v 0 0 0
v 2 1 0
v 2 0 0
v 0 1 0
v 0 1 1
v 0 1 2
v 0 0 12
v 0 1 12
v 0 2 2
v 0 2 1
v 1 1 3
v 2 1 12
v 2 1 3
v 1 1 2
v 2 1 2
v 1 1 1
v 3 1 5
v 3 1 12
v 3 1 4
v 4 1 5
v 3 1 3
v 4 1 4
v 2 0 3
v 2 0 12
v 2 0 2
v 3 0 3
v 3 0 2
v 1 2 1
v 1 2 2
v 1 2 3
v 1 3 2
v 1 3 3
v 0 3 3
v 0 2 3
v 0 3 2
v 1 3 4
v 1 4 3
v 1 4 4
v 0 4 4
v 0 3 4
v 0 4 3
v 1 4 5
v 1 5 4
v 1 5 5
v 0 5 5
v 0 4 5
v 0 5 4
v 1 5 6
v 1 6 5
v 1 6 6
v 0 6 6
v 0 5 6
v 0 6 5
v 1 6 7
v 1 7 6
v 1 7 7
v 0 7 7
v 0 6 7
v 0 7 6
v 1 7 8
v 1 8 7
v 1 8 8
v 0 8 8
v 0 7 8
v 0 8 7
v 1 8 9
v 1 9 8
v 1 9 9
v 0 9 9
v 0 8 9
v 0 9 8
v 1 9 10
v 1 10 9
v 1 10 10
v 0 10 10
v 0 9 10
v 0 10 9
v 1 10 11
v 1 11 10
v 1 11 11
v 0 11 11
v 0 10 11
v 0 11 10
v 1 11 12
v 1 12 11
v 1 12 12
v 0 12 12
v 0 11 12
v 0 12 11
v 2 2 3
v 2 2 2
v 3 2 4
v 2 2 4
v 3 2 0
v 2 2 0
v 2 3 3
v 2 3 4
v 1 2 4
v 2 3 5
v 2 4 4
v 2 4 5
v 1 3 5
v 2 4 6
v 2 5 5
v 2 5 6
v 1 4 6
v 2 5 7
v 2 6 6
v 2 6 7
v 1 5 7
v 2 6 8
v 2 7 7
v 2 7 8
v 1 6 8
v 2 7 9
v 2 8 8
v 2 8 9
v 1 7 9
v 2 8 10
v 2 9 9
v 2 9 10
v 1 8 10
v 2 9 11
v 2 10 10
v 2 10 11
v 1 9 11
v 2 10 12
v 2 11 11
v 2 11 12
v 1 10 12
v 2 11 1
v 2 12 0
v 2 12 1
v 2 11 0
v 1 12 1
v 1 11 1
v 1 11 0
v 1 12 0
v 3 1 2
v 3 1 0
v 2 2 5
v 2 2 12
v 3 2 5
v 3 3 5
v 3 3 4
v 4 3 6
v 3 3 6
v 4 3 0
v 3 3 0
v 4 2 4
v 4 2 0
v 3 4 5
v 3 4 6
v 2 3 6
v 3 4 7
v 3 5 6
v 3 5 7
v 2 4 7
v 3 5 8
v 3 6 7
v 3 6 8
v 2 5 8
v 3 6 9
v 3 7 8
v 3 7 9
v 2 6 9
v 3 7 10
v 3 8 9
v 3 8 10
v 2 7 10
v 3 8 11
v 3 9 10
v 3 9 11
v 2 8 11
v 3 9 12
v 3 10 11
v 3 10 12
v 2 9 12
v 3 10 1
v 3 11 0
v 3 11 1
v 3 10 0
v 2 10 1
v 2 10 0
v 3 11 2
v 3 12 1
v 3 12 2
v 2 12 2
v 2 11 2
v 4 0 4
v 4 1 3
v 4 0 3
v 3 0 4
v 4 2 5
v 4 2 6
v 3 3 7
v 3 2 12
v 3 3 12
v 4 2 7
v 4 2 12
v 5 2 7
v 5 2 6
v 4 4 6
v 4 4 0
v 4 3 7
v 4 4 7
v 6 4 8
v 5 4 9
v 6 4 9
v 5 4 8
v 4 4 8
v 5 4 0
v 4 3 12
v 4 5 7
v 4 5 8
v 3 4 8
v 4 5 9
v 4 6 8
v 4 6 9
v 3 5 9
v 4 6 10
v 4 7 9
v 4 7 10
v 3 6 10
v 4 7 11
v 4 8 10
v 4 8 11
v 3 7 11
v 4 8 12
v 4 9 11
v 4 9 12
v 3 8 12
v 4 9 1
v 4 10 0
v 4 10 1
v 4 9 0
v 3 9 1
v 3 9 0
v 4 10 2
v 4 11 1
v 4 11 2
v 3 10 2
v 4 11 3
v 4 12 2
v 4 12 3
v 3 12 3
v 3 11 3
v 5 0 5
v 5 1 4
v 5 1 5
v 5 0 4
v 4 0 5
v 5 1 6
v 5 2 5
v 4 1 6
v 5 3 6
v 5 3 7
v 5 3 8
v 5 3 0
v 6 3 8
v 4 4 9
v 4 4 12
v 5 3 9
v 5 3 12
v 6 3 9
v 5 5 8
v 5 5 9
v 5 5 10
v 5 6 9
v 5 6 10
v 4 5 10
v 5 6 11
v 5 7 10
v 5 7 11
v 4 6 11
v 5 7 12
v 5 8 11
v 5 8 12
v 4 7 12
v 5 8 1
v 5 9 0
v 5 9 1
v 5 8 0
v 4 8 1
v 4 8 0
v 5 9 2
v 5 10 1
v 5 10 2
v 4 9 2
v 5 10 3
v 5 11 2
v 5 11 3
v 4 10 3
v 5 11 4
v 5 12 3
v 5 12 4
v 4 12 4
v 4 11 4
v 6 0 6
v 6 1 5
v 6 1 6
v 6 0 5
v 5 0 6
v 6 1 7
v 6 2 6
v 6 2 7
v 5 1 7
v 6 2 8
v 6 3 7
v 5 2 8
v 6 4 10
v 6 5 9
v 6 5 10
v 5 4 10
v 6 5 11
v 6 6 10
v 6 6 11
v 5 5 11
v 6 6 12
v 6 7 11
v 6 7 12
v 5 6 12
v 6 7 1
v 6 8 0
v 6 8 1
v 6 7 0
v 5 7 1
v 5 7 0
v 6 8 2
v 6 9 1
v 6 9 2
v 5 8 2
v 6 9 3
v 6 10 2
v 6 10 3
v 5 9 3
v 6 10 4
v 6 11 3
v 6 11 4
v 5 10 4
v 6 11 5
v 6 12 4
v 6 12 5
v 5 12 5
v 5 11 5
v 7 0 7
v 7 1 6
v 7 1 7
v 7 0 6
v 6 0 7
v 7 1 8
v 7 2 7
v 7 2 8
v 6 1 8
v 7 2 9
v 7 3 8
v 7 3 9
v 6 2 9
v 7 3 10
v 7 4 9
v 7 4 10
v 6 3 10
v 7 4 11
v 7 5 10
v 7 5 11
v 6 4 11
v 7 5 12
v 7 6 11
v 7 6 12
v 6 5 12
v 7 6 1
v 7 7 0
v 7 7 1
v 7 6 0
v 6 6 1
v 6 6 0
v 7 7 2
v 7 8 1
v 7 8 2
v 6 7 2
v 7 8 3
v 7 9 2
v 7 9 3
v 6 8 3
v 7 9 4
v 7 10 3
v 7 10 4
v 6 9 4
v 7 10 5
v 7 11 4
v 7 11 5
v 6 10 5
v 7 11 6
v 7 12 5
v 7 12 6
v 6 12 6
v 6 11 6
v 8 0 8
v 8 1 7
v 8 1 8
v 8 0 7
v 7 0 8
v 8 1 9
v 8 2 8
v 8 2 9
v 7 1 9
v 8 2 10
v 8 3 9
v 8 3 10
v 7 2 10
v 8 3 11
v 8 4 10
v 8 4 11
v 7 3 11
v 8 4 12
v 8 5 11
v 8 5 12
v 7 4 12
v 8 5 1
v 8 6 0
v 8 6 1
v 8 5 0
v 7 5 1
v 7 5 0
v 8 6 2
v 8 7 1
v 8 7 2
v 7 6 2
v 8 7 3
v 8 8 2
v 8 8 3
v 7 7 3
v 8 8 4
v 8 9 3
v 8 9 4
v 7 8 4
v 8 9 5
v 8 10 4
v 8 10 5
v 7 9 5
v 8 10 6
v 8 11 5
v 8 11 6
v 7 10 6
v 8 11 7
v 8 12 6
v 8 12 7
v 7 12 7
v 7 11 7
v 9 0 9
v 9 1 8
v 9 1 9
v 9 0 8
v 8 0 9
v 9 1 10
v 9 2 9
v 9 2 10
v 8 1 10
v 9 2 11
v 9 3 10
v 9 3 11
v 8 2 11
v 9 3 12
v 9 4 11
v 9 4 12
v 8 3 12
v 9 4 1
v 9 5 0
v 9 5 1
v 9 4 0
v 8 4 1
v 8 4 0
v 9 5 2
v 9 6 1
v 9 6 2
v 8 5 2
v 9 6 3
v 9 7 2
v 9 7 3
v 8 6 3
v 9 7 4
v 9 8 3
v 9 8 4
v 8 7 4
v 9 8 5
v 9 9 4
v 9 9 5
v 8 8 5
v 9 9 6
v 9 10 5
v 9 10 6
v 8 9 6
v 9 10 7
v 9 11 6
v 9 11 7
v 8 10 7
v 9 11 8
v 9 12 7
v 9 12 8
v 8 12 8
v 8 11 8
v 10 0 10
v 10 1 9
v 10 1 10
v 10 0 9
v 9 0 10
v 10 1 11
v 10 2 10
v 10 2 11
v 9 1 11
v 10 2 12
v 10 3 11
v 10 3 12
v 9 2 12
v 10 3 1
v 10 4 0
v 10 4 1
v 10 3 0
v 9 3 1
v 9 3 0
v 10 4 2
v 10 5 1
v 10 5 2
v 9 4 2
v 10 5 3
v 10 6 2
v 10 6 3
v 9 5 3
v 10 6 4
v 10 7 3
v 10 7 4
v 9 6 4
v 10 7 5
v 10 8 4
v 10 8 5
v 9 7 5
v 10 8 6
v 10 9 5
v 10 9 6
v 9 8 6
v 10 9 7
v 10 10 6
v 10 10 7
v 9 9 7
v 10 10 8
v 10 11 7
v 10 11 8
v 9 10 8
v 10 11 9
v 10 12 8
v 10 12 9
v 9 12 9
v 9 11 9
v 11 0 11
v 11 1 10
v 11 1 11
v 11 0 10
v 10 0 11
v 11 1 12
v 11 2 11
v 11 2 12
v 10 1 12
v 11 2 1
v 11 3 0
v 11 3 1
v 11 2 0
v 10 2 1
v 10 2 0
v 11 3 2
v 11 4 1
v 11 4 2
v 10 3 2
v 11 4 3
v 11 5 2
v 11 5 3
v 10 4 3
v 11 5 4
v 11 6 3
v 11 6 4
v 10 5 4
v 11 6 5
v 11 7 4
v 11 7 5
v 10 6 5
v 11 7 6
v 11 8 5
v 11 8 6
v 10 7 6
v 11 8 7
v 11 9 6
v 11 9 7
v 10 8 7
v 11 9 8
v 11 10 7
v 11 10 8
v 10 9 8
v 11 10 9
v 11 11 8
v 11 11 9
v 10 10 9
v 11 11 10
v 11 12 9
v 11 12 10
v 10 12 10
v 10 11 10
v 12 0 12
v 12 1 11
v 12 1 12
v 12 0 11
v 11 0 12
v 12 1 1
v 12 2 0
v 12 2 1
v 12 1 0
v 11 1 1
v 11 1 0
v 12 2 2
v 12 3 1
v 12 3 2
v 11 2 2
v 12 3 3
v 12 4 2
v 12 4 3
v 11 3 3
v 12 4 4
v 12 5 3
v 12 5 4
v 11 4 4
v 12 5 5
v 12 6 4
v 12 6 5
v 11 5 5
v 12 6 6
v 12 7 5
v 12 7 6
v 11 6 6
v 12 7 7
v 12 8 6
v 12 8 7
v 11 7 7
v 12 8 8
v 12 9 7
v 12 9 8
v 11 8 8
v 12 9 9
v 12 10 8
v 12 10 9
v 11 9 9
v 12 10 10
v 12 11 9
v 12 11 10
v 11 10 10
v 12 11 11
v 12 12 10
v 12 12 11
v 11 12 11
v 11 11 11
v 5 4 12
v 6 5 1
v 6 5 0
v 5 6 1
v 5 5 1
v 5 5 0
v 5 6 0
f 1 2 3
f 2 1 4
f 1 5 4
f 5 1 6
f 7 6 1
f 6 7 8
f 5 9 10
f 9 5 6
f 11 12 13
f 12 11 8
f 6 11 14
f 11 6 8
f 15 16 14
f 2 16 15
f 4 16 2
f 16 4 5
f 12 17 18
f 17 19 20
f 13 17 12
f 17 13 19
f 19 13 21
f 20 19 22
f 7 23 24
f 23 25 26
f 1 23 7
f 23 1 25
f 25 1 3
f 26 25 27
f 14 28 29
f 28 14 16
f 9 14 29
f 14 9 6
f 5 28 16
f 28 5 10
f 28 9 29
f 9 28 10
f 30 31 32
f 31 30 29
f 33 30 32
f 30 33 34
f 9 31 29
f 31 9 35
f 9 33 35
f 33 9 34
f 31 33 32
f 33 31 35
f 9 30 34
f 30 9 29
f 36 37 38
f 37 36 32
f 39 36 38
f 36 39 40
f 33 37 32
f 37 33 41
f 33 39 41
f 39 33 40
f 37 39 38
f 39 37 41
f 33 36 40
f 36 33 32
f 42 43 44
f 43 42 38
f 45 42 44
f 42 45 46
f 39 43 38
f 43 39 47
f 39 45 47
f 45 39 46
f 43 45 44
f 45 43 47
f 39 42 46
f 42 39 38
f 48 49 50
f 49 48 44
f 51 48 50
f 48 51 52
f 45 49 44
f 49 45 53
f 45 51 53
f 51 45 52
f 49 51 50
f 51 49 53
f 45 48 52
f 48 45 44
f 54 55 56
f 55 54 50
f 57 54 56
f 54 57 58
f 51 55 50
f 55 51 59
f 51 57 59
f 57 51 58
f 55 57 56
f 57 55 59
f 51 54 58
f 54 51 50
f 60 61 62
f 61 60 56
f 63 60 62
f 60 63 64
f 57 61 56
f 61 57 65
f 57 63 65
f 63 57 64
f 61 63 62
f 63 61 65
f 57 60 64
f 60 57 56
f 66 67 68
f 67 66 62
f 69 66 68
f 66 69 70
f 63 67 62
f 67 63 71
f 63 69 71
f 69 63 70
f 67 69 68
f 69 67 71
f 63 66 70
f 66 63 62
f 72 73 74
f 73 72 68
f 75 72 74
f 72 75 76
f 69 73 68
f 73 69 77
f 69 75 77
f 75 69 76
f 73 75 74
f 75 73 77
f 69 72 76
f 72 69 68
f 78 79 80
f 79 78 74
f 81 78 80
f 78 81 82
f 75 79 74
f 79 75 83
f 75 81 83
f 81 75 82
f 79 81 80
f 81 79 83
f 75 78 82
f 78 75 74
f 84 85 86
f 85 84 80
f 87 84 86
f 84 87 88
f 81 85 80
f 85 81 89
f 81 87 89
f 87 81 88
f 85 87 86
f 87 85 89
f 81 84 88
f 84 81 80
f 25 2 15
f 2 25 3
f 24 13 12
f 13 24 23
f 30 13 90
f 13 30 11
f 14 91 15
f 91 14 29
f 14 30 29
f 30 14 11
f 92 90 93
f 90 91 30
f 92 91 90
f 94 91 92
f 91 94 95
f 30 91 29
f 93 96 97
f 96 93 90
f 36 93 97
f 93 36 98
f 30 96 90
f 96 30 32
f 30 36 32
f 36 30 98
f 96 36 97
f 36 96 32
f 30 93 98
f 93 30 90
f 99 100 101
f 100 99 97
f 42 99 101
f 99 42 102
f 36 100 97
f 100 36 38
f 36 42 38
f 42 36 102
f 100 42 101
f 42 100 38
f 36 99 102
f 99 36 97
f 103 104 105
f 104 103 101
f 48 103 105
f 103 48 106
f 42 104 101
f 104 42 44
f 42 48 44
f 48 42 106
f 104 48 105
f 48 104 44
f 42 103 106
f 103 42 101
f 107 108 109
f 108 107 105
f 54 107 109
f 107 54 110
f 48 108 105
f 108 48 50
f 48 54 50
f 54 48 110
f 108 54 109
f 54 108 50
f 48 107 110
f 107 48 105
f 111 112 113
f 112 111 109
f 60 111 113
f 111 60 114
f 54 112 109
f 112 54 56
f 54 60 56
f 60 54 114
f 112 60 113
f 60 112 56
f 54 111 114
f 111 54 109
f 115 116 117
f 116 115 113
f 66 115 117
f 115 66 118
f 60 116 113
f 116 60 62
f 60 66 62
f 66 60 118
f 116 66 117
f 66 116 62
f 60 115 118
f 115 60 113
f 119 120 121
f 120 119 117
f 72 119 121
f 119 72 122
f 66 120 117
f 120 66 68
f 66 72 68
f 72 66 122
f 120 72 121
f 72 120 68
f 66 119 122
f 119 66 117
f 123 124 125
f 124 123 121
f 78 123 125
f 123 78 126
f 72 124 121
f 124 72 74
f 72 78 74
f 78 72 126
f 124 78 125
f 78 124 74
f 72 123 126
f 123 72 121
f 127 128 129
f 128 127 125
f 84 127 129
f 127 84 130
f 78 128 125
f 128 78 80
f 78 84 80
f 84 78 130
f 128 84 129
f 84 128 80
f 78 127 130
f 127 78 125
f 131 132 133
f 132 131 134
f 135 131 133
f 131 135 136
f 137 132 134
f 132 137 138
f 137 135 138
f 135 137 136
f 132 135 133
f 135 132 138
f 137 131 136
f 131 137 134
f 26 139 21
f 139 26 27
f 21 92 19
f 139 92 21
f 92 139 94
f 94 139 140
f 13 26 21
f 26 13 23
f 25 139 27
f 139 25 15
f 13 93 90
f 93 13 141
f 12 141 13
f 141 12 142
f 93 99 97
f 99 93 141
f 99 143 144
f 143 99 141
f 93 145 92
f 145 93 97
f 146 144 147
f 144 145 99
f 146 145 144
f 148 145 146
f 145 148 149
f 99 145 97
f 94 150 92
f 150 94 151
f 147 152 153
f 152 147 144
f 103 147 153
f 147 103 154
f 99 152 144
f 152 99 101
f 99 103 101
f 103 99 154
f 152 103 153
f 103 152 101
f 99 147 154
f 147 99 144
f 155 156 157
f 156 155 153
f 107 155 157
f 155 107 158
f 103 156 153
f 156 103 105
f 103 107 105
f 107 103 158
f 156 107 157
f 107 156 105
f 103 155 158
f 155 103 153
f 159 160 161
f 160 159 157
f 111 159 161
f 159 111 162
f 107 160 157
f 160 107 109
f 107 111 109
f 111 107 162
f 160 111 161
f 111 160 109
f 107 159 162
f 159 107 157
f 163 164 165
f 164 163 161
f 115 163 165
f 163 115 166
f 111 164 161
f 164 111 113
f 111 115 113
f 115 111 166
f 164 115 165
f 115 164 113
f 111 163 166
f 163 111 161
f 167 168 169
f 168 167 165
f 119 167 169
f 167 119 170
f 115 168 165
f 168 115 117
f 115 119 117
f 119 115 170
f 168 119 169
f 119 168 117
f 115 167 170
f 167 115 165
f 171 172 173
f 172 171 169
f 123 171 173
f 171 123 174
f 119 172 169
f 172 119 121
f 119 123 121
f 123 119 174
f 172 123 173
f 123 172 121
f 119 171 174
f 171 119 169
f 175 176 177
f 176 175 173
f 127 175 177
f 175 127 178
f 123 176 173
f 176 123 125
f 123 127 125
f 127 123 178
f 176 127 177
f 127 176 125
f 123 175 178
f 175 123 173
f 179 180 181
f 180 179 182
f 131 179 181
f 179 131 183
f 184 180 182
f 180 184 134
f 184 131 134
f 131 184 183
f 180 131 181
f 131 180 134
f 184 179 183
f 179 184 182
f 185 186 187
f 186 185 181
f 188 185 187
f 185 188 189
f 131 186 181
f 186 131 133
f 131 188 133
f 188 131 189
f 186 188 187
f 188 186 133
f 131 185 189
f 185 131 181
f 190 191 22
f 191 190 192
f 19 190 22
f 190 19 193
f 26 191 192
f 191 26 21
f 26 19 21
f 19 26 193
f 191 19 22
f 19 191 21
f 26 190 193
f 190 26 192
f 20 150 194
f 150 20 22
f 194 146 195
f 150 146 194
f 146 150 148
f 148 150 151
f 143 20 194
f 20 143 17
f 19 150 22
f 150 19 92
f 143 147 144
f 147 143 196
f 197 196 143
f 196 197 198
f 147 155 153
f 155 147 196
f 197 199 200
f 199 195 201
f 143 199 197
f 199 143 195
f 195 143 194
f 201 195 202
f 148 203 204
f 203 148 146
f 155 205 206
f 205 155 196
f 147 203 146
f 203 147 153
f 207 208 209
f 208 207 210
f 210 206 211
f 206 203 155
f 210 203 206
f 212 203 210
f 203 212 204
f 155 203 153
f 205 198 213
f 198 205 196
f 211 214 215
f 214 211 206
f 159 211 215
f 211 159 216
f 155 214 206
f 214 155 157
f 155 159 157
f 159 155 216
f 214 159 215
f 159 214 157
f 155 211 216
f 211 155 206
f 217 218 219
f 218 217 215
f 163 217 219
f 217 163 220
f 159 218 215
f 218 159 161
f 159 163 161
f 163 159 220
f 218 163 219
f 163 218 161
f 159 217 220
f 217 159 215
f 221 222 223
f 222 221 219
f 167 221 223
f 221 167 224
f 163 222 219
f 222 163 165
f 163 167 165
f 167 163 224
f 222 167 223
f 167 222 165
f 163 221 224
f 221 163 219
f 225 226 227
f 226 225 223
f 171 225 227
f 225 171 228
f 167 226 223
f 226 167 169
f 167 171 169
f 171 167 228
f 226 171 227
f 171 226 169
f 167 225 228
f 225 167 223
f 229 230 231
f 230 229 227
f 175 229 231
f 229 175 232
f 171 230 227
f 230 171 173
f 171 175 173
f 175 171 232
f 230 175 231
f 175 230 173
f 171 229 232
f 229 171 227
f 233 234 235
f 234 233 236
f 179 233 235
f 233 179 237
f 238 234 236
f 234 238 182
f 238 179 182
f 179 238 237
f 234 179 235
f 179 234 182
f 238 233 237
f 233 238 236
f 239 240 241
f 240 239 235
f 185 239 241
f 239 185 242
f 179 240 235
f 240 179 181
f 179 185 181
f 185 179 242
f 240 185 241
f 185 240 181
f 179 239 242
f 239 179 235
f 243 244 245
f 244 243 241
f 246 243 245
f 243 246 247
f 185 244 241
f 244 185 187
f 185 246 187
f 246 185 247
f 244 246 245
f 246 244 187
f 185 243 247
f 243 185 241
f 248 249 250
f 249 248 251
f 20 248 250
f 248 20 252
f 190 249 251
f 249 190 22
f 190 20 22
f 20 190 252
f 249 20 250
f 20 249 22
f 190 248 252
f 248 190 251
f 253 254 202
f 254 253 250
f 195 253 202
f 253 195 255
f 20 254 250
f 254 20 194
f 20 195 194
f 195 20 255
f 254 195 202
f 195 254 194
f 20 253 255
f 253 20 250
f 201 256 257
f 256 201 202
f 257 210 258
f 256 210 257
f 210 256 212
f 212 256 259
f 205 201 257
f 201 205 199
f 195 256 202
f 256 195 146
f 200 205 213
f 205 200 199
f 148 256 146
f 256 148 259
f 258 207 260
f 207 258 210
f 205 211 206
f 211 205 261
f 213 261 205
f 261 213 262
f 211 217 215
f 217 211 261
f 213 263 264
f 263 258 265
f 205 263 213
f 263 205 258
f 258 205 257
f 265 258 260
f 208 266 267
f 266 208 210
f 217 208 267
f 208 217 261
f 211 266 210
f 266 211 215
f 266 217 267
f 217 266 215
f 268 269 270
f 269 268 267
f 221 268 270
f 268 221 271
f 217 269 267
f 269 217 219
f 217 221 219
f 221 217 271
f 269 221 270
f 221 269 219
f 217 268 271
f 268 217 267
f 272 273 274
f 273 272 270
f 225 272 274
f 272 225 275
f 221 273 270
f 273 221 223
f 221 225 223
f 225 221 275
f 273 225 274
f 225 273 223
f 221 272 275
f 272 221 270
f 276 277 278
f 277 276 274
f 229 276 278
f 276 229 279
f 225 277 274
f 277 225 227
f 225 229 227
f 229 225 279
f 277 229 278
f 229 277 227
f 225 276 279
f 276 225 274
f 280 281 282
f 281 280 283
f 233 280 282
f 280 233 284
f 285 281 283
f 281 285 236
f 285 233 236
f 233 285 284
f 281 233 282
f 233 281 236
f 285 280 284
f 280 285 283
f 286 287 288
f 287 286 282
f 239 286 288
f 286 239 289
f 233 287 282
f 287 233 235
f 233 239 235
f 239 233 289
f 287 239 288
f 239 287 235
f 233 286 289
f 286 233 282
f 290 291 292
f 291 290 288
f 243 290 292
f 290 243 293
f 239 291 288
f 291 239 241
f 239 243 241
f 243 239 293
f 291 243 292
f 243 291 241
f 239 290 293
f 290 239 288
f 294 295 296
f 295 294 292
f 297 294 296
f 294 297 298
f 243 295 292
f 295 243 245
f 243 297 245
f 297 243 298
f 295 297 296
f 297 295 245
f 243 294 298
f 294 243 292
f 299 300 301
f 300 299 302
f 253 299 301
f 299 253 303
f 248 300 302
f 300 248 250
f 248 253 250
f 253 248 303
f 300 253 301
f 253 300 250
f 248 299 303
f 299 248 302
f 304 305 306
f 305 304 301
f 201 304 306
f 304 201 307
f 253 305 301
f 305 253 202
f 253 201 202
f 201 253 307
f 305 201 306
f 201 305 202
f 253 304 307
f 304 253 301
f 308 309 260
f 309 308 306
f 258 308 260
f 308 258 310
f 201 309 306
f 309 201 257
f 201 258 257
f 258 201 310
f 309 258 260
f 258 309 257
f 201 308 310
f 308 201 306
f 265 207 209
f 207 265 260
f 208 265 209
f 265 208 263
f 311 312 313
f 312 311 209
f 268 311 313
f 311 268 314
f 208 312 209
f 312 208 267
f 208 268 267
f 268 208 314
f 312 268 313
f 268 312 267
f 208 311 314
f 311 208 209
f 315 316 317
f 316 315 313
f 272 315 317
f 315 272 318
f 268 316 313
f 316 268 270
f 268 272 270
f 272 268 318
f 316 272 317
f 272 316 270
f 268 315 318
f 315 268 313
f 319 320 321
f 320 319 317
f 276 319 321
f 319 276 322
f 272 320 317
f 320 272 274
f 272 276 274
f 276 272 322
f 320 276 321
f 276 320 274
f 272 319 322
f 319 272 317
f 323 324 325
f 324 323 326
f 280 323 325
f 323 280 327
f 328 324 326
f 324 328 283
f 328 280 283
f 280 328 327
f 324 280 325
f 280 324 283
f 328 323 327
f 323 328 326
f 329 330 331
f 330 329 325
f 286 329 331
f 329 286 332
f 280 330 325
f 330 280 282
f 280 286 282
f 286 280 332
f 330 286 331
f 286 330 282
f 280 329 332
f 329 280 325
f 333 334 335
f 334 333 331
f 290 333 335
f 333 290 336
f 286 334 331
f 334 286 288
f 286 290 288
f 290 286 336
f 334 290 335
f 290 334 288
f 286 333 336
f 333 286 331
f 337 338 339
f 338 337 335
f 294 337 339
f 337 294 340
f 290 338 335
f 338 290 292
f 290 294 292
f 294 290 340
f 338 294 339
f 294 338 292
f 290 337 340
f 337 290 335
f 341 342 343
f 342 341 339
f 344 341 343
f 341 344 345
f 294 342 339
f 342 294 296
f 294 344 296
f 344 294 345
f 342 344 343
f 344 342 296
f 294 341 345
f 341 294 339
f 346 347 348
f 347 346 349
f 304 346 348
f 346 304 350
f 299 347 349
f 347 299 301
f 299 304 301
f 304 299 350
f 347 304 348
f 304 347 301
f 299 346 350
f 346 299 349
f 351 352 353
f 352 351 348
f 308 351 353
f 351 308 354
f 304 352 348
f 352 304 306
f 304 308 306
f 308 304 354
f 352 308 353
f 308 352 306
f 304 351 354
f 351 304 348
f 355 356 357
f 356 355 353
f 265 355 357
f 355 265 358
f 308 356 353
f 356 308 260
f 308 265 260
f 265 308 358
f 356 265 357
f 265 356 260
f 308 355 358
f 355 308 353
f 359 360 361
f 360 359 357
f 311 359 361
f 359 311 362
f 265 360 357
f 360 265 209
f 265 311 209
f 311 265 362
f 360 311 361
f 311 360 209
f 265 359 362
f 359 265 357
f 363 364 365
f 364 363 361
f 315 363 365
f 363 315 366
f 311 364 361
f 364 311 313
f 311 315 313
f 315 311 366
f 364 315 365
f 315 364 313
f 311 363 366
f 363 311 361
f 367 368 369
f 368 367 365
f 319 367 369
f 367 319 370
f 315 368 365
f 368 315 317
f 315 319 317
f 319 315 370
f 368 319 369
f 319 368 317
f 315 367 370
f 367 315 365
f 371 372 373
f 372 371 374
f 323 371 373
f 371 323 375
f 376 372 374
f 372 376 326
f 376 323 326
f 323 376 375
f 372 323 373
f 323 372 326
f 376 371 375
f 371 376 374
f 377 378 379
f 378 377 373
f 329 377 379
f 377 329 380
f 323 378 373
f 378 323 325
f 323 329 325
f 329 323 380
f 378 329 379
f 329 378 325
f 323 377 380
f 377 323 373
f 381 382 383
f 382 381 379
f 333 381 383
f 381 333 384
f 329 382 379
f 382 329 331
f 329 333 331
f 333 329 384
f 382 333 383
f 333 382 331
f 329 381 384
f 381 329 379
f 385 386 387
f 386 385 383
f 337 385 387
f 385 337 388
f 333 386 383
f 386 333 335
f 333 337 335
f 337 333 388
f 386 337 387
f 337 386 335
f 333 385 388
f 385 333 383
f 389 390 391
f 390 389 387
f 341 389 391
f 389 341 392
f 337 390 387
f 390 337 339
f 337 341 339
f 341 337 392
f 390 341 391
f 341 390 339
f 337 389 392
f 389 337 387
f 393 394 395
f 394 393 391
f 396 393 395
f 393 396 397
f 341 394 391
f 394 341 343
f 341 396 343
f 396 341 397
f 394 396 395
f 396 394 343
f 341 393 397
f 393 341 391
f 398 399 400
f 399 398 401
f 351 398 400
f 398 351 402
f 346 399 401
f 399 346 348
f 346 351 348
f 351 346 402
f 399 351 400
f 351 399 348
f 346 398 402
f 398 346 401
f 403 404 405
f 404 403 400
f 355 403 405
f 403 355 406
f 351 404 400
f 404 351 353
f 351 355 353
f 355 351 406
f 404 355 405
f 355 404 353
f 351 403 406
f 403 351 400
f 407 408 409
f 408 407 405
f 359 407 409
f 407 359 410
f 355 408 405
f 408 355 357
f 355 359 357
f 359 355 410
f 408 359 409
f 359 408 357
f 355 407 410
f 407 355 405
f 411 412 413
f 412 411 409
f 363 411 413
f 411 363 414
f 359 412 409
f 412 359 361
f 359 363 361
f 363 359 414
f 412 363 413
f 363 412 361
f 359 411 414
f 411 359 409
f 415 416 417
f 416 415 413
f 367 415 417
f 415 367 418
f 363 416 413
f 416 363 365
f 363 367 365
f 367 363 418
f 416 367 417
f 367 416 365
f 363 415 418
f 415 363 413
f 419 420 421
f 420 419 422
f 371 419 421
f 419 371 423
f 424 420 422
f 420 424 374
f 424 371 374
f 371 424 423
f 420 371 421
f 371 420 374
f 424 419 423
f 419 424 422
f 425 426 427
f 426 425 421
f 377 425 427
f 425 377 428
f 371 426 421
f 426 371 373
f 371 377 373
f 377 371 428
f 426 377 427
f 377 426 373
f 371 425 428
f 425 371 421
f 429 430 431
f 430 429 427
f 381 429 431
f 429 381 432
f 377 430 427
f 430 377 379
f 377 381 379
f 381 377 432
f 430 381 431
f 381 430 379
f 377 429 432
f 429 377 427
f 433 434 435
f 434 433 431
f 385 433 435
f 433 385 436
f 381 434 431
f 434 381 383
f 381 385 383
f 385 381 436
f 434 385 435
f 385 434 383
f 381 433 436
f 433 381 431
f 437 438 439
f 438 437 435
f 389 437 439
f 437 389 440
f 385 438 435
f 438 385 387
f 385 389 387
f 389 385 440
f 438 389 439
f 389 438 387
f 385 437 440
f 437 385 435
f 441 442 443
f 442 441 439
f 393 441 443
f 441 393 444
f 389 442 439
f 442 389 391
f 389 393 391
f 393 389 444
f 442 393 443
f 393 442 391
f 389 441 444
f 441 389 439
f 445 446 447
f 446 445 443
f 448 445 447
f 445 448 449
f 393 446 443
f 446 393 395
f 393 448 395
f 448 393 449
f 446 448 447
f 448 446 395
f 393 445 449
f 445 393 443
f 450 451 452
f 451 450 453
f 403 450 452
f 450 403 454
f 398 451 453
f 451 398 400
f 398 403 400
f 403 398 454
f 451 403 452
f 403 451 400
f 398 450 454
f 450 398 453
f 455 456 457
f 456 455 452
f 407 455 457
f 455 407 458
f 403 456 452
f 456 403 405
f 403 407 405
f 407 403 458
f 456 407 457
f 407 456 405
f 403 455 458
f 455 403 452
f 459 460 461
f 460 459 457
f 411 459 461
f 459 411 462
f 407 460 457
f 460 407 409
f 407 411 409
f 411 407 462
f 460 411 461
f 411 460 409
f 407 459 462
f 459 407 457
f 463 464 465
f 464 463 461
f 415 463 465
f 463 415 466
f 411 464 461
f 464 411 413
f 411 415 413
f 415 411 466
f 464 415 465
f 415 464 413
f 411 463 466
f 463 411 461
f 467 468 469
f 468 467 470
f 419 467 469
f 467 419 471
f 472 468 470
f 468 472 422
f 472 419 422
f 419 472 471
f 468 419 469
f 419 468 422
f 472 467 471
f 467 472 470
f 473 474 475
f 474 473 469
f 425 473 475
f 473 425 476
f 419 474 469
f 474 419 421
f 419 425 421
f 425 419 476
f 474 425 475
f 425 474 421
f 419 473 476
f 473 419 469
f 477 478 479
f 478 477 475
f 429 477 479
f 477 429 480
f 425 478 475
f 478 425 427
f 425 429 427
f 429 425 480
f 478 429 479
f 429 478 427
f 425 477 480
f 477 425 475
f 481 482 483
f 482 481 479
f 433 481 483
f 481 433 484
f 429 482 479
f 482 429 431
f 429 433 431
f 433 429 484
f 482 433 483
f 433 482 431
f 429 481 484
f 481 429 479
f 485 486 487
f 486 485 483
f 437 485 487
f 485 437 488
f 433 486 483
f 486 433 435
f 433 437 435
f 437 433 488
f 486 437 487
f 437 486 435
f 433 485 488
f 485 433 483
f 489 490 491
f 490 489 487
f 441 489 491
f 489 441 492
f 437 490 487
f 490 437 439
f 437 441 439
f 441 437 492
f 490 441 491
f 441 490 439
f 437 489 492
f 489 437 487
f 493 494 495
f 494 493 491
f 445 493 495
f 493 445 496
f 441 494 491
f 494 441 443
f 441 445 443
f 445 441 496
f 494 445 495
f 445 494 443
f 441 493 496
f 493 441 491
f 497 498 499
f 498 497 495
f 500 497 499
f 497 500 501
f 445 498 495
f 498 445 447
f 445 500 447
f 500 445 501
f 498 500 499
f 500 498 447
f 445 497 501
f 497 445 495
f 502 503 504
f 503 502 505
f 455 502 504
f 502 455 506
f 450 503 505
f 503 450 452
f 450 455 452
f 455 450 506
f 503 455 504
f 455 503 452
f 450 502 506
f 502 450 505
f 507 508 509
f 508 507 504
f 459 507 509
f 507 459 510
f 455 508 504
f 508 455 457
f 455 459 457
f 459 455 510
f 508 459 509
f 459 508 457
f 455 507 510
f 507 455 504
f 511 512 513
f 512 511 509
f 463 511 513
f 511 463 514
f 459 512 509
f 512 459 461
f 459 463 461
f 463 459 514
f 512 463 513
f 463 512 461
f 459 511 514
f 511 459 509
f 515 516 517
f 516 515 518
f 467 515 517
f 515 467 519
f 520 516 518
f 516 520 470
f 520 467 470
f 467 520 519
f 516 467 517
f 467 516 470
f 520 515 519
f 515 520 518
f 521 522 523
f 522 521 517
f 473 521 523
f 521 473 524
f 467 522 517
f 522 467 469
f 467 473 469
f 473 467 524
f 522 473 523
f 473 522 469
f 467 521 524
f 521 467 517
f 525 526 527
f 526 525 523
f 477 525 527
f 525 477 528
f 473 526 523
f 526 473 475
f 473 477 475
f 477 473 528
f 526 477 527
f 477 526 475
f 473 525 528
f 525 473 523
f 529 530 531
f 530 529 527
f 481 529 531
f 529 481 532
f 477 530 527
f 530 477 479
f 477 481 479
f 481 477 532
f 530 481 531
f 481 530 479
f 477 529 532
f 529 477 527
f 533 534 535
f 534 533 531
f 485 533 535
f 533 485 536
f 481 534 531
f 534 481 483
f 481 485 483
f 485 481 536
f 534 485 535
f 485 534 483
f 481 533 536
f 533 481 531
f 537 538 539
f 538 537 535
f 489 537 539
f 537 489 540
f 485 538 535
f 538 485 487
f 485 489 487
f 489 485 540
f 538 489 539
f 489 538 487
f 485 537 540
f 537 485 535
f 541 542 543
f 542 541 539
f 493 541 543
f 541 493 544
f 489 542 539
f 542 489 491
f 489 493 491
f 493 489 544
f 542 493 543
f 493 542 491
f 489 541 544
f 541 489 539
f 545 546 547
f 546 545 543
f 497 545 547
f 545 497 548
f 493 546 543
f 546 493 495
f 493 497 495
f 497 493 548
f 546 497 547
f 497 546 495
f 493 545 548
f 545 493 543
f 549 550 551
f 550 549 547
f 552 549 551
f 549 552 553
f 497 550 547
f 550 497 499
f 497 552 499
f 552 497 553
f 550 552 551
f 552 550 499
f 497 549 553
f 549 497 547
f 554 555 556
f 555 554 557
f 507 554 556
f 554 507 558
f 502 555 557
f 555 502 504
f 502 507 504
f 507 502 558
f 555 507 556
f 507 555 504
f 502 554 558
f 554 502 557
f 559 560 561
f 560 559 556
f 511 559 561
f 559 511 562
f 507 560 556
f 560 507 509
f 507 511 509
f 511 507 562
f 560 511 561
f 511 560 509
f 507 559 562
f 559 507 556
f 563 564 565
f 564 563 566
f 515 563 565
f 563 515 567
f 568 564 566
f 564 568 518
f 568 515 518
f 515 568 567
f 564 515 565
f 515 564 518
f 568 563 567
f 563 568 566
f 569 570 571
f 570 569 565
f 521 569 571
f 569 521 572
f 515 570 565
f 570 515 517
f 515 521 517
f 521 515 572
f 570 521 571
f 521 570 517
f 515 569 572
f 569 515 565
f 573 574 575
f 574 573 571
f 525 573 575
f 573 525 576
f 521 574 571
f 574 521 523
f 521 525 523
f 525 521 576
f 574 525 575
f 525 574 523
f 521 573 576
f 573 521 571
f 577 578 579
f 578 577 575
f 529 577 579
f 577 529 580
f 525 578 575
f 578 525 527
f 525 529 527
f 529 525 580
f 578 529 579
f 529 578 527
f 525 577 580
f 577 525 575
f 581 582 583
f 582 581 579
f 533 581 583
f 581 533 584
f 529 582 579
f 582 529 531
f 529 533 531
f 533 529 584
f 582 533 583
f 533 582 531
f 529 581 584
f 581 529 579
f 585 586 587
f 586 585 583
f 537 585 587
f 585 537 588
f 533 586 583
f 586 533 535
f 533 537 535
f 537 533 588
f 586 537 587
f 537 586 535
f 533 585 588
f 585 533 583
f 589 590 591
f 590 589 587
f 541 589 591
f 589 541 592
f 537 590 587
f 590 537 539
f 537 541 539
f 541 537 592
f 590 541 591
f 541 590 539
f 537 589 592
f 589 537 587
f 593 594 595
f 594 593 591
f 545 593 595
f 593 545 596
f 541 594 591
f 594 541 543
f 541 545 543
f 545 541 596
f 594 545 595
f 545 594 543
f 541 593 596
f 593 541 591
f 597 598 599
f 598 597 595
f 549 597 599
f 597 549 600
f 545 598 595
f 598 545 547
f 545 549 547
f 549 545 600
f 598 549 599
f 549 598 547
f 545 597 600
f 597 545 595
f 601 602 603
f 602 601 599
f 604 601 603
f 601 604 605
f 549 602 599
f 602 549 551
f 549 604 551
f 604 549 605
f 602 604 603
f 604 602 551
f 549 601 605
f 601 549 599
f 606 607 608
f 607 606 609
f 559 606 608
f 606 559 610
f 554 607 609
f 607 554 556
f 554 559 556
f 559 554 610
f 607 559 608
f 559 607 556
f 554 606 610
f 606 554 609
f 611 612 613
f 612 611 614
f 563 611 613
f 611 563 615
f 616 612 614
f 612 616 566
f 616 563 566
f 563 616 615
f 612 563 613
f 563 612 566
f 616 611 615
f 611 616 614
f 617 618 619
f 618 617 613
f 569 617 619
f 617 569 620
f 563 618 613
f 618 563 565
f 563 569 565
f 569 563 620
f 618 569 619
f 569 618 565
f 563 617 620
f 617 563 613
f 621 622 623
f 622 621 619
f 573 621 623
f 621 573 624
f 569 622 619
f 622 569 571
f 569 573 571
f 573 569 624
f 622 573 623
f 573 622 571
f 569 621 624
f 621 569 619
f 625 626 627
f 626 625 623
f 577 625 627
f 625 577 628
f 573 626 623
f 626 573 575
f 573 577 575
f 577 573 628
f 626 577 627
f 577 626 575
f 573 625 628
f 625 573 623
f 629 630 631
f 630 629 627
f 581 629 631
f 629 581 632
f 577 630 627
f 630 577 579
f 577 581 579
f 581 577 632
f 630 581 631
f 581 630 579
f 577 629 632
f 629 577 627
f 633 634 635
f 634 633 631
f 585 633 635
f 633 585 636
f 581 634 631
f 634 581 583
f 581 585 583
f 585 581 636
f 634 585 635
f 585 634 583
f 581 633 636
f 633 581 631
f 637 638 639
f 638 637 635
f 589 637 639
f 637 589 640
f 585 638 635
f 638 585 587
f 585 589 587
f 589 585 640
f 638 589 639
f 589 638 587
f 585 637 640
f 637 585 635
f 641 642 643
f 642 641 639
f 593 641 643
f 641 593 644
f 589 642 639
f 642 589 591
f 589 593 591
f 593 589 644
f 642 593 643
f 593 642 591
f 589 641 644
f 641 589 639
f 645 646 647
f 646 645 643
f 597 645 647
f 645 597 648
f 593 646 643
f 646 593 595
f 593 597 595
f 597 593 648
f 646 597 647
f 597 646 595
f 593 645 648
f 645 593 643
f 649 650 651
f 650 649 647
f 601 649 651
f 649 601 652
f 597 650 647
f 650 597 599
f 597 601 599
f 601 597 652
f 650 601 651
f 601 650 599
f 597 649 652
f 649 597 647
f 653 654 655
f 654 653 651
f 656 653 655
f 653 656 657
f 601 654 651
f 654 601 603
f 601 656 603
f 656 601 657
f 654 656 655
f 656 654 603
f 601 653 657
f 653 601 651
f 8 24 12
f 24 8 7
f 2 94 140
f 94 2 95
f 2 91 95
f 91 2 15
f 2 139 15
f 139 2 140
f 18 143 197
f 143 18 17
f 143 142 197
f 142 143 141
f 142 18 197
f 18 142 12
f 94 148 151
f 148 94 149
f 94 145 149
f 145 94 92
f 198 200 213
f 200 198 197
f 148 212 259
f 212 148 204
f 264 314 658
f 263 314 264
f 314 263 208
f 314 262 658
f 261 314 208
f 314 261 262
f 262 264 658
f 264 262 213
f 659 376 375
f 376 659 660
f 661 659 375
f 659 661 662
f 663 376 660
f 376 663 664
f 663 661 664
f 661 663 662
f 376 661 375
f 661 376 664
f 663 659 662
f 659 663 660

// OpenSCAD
union() {
    translate([0, 0, 0]) cube([1, 1, 1]);
    translate([0, 1, 1]) cube([1, 1, 1]);
    translate([0, 2, 2]) cube([1, 1, 1]);
    translate([0, 3, 3]) cube([1, 1, 1]);
    translate([0, 4, 4]) cube([1, 1, 1]);
    translate([0, 5, 5]) cube([1, 1, 1]);
    translate([0, 6, 6]) cube([1, 1, 1]);
    translate([0, 7, 7]) cube([1, 1, 1]);
    translate([0, 8, 8]) cube([1, 1, 1]);
    translate([0, 9, 9]) cube([1, 1, 1]);
    translate([0, 10, 10]) cube([1, 1, 1]);
    translate([0, 11, 11]) cube([1, 1, 1]);
    translate([1, 0, 1]) cube([1, 1, 1]);
    translate([1, 1, 2]) cube([1, 1, 1]);
    translate([1, 2, 3]) cube([1, 1, 1]);
    translate([1, 3, 4]) cube([1, 1, 1]);
    translate([1, 4, 5]) cube([1, 1, 1]);
    translate([1, 5, 6]) cube([1, 1, 1]);
    translate([1, 6, 7]) cube([1, 1, 1]);
    translate([1, 7, 8]) cube([1, 1, 1]);
    translate([1, 8, 9]) cube([1, 1, 1]);
    translate([1, 9, 10]) cube([1, 1, 1]);
    translate([1, 10, 11]) cube([1, 1, 1]);
    translate([1, 11, 0]) cube([1, 1, 1]);
    translate([2, 0, 2]) cube([1, 1, 1]);
    translate([2, 1, 3]) cube([1, 1, 1]);
    translate([2, 2, 4]) cube([1, 1, 1]);
    translate([2, 3, 5]) cube([1, 1, 1]);
    translate([2, 4, 6]) cube([1, 1, 1]);
    translate([2, 5, 7]) cube([1, 1, 1]);
    translate([2, 6, 8]) cube([1, 1, 1]);
    translate([2, 7, 9]) cube([1, 1, 1]);
    translate([2, 8, 10]) cube([1, 1, 1]);
    translate([2, 9, 11]) cube([1, 1, 1]);
    translate([2, 10, 0]) cube([1, 1, 1]);
    translate([2, 11, 1]) cube([1, 1, 1]);
    translate([3, 0, 3]) cube([1, 1, 1]);
    translate([3, 1, 4]) cube([1, 1, 1]);
    translate([3, 2, 5]) cube([1, 1, 1]);
    translate([3, 3, 6]) cube([1, 1, 1]);
    translate([3, 4, 7]) cube([1, 1, 1]);
    translate([3, 5, 8]) cube([1, 1, 1]);
    translate([3, 6, 9]) cube([1, 1, 1]);
    translate([3, 7, 10]) cube([1, 1, 1]);
    translate([3, 8, 11]) cube([1, 1, 1]);
    translate([3, 9, 0]) cube([1, 1, 1]);
    translate([3, 10, 1]) cube([1, 1, 1]);
    translate([3, 11, 2]) cube([1, 1, 1]);
    translate([4, 0, 4]) cube([1, 1, 1]);
    translate([4, 1, 5]) cube([1, 1, 1]);
    translate([4, 2, 6]) cube([1, 1, 1]);
    translate([4, 3, 7]) cube([1, 1, 1]);
    translate([4, 4, 8]) cube([1, 1, 1]);
    translate([4, 5, 9]) cube([1, 1, 1]);
    translate([4, 6, 10]) cube([1, 1, 1]);
    translate([4, 7, 11]) cube([1, 1, 1]);
    translate([4, 8, 0]) cube([1, 1, 1]);
    translate([4, 9, 1]) cube([1, 1, 1]);
    translate([4, 10, 2]) cube([1, 1, 1]);
    translate([4, 11, 3]) cube([1, 1, 1]);
    translate([5, 0, 5]) cube([1, 1, 1]);
    translate([5, 1, 6]) cube([1, 1, 1]);
    translate([5, 2, 7]) cube([1, 1, 1]);
    translate([5, 3, 8]) cube([1, 1, 1]);
    translate([5, 4, 9]) cube([1, 1, 1]);
    translate([5, 5, 10]) cube([1, 1, 1]);
    translate([5, 6, 11]) cube([1, 1, 1]);
    translate([5, 7, 0]) cube([1, 1, 1]);
    translate([5, 8, 1]) cube([1, 1, 1]);
    translate([5, 9, 2]) cube([1, 1, 1]);
    translate([5, 10, 3]) cube([1, 1, 1]);
    translate([5, 11, 4]) cube([1, 1, 1]);
    translate([6, 0, 6]) cube([1, 1, 1]);
    translate([6, 1, 7]) cube([1, 1, 1]);
    translate([6, 2, 8]) cube([1, 1, 1]);
    translate([6, 3, 9]) cube([1, 1, 1]);
    translate([6, 4, 10]) cube([1, 1, 1]);
    translate([6, 5, 11]) cube([1, 1, 1]);
    translate([6, 6, 0]) cube([1, 1, 1]);
    translate([6, 7, 1]) cube([1, 1, 1]);
    translate([6, 8, 2]) cube([1, 1, 1]);
    translate([6, 9, 3]) cube([1, 1, 1]);
    translate([6, 10, 4]) cube([1, 1, 1]);
    translate([6, 11, 5]) cube([1, 1, 1]);
    translate([7, 0, 7]) cube([1, 1, 1]);
    translate([7, 1, 8]) cube([1, 1, 1]);
    translate([7, 2, 9]) cube([1, 1, 1]);
    translate([7, 3, 10]) cube([1, 1, 1]);
    translate([7, 4, 11]) cube([1, 1, 1]);
    translate([7, 5, 0]) cube([1, 1, 1]);
    translate([7, 6, 1]) cube([1, 1, 1]);
    translate([7, 7, 2]) cube([1, 1, 1]);
    translate([7, 8, 3]) cube([1, 1, 1]);
    translate([7, 9, 4]) cube([1, 1, 1]);
    translate([7, 10, 5]) cube([1, 1, 1]);
    translate([7, 11, 6]) cube([1, 1, 1]);
    translate([8, 0, 8]) cube([1, 1, 1]);
    translate([8, 1, 9]) cube([1, 1, 1]);
    translate([8, 2, 10]) cube([1, 1, 1]);
    translate([8, 3, 11]) cube([1, 1, 1]);
    translate([8, 4, 0]) cube([1, 1, 1]);
    translate([8, 5, 1]) cube([1, 1, 1]);
    translate([8, 6, 2]) cube([1, 1, 1]);
    translate([8, 7, 3]) cube([1, 1, 1]);
    translate([8, 8, 4]) cube([1, 1, 1]);
    translate([8, 9, 5]) cube([1, 1, 1]);
    translate([8, 10, 6]) cube([1, 1, 1]);
    translate([8, 11, 7]) cube([1, 1, 1]);
    translate([9, 0, 9]) cube([1, 1, 1]);
    translate([9, 1, 10]) cube([1, 1, 1]);
    translate([9, 2, 11]) cube([1, 1, 1]);
    translate([9, 3, 0]) cube([1, 1, 1]);
    translate([9, 4, 1]) cube([1, 1, 1]);
    translate([9, 5, 2]) cube([1, 1, 1]);
    translate([9, 6, 3]) cube([1, 1, 1]);
    translate([9, 7, 4]) cube([1, 1, 1]);
    translate([9, 8, 5]) cube([1, 1, 1]);
    translate([9, 9, 6]) cube([1, 1, 1]);
    translate([9, 10, 7]) cube([1, 1, 1]);
    translate([9, 11, 8]) cube([1, 1, 1]);
    translate([10, 0, 10]) cube([1, 1, 1]);
    translate([10, 1, 11]) cube([1, 1, 1]);
    translate([10, 2, 0]) cube([1, 1, 1]);
    translate([10, 3, 1]) cube([1, 1, 1]);
    translate([10, 4, 2]) cube([1, 1, 1]);
    translate([10, 5, 3]) cube([1, 1, 1]);
    translate([10, 6, 4]) cube([1, 1, 1]);
    translate([10, 7, 5]) cube([1, 1, 1]);
    translate([10, 8, 6]) cube([1, 1, 1]);
    translate([10, 9, 7]) cube([1, 1, 1]);
    translate([10, 10, 8]) cube([1, 1, 1]);
    translate([10, 11, 9]) cube([1, 1, 1]);
    translate([11, 0, 11]) cube([1, 1, 1]);
    translate([11, 1, 0]) cube([1, 1, 1]);
    translate([11, 2, 1]) cube([1, 1, 1]);
    translate([11, 3, 2]) cube([1, 1, 1]);
    translate([11, 4, 3]) cube([1, 1, 1]);
    translate([11, 5, 4]) cube([1, 1, 1]);
    translate([11, 6, 5]) cube([1, 1, 1]);
    translate([11, 7, 6]) cube([1, 1, 1]);
    translate([11, 8, 7]) cube([1, 1, 1]);
    translate([11, 9, 8]) cube([1, 1, 1]);
    translate([11, 10, 9]) cube([1, 1, 1]);
    translate([11, 11, 10]) cube([1, 1, 1]);
    translate([0, 0, 1]) cube([1, 1, 1]);
    translate([0, 0, 2]) cube([1, 1, 1]);
    translate([0, 0, 3]) cube([1, 1, 1]);
    translate([0, 0, 4]) cube([1, 1, 1]);
    translate([0, 0, 5]) cube([1, 1, 1]);
    translate([0, 0, 6]) cube([1, 1, 1]);
    translate([0, 0, 7]) cube([1, 1, 1]);
    translate([0, 0, 8]) cube([1, 1, 1]);
    translate([0, 0, 9]) cube([1, 1, 1]);
    translate([0, 0, 10]) cube([1, 1, 1]);
    translate([0, 0, 11]) cube([1, 1, 1]);
    translate([1, 0, 0]) cube([1, 1, 1]);
    translate([1, 0, 2]) cube([1, 1, 1]);
    translate([1, 0, 3]) cube([1, 1, 1]);
    translate([1, 0, 4]) cube([1, 1, 1]);
    translate([1, 0, 5]) cube([1, 1, 1]);
    translate([1, 0, 6]) cube([1, 1, 1]);
    translate([1, 0, 7]) cube([1, 1, 1]);
    translate([1, 0, 8]) cube([1, 1, 1]);
    translate([1, 0, 9]) cube([1, 1, 1]);
    translate([1, 0, 10]) cube([1, 1, 1]);
    translate([1, 0, 11]) cube([1, 1, 1]);
    translate([2, 1, 0]) cube([1, 1, 1]);
    translate([2, 1, 1]) cube([1, 1, 1]);
    translate([2, 1, 2]) cube([1, 1, 1]);
    translate([2, 1, 4]) cube([1, 1, 1]);
    translate([2, 1, 5]) cube([1, 1, 1]);
    translate([2, 1, 6]) cube([1, 1, 1]);
    translate([2, 1, 7]) cube([1, 1, 1]);
    translate([2, 1, 8]) cube([1, 1, 1]);
    translate([2, 1, 9]) cube([1, 1, 1]);
    translate([2, 1, 10]) cube([1, 1, 1]);
    translate([2, 1, 11]) cube([1, 1, 1]);
    translate([3, 2, 0]) cube([1, 1, 1]);
    translate([3, 2, 1]) cube([1, 1, 1]);
    translate([3, 2, 2]) cube([1, 1, 1]);
    translate([3, 2, 3]) cube([1, 1, 1]);
    translate([3, 2, 4]) cube([1, 1, 1]);
    translate([3, 2, 6]) cube([1, 1, 1]);
    translate([3, 2, 7]) cube([1, 1, 1]);
    translate([3, 2, 8]) cube([1, 1, 1]);
    translate([3, 2, 9]) cube([1, 1, 1]);
    translate([3, 2, 10]) cube([1, 1, 1]);
    translate([3, 2, 11]) cube([1, 1, 1]);
    translate([4, 3, 0]) cube([1, 1, 1]);
    translate([4, 3, 1]) cube([1, 1, 1]);
    translate([4, 3, 2]) cube([1, 1, 1]);
    translate([4, 3, 3]) cube([1, 1, 1]);
    translate([4, 3, 4]) cube([1, 1, 1]);
    translate([4, 3, 5]) cube([1, 1, 1]);
    translate([4, 3, 6]) cube([1, 1, 1]);
    translate([4, 3, 8]) cube([1, 1, 1]);
    translate([4, 3, 9]) cube([1, 1, 1]);
    translate([4, 3, 10]) cube([1, 1, 1]);
    translate([4, 3, 11]) cube([1, 1, 1]);
    translate([5, 5, 0]) cube([1, 1, 1]);
}
